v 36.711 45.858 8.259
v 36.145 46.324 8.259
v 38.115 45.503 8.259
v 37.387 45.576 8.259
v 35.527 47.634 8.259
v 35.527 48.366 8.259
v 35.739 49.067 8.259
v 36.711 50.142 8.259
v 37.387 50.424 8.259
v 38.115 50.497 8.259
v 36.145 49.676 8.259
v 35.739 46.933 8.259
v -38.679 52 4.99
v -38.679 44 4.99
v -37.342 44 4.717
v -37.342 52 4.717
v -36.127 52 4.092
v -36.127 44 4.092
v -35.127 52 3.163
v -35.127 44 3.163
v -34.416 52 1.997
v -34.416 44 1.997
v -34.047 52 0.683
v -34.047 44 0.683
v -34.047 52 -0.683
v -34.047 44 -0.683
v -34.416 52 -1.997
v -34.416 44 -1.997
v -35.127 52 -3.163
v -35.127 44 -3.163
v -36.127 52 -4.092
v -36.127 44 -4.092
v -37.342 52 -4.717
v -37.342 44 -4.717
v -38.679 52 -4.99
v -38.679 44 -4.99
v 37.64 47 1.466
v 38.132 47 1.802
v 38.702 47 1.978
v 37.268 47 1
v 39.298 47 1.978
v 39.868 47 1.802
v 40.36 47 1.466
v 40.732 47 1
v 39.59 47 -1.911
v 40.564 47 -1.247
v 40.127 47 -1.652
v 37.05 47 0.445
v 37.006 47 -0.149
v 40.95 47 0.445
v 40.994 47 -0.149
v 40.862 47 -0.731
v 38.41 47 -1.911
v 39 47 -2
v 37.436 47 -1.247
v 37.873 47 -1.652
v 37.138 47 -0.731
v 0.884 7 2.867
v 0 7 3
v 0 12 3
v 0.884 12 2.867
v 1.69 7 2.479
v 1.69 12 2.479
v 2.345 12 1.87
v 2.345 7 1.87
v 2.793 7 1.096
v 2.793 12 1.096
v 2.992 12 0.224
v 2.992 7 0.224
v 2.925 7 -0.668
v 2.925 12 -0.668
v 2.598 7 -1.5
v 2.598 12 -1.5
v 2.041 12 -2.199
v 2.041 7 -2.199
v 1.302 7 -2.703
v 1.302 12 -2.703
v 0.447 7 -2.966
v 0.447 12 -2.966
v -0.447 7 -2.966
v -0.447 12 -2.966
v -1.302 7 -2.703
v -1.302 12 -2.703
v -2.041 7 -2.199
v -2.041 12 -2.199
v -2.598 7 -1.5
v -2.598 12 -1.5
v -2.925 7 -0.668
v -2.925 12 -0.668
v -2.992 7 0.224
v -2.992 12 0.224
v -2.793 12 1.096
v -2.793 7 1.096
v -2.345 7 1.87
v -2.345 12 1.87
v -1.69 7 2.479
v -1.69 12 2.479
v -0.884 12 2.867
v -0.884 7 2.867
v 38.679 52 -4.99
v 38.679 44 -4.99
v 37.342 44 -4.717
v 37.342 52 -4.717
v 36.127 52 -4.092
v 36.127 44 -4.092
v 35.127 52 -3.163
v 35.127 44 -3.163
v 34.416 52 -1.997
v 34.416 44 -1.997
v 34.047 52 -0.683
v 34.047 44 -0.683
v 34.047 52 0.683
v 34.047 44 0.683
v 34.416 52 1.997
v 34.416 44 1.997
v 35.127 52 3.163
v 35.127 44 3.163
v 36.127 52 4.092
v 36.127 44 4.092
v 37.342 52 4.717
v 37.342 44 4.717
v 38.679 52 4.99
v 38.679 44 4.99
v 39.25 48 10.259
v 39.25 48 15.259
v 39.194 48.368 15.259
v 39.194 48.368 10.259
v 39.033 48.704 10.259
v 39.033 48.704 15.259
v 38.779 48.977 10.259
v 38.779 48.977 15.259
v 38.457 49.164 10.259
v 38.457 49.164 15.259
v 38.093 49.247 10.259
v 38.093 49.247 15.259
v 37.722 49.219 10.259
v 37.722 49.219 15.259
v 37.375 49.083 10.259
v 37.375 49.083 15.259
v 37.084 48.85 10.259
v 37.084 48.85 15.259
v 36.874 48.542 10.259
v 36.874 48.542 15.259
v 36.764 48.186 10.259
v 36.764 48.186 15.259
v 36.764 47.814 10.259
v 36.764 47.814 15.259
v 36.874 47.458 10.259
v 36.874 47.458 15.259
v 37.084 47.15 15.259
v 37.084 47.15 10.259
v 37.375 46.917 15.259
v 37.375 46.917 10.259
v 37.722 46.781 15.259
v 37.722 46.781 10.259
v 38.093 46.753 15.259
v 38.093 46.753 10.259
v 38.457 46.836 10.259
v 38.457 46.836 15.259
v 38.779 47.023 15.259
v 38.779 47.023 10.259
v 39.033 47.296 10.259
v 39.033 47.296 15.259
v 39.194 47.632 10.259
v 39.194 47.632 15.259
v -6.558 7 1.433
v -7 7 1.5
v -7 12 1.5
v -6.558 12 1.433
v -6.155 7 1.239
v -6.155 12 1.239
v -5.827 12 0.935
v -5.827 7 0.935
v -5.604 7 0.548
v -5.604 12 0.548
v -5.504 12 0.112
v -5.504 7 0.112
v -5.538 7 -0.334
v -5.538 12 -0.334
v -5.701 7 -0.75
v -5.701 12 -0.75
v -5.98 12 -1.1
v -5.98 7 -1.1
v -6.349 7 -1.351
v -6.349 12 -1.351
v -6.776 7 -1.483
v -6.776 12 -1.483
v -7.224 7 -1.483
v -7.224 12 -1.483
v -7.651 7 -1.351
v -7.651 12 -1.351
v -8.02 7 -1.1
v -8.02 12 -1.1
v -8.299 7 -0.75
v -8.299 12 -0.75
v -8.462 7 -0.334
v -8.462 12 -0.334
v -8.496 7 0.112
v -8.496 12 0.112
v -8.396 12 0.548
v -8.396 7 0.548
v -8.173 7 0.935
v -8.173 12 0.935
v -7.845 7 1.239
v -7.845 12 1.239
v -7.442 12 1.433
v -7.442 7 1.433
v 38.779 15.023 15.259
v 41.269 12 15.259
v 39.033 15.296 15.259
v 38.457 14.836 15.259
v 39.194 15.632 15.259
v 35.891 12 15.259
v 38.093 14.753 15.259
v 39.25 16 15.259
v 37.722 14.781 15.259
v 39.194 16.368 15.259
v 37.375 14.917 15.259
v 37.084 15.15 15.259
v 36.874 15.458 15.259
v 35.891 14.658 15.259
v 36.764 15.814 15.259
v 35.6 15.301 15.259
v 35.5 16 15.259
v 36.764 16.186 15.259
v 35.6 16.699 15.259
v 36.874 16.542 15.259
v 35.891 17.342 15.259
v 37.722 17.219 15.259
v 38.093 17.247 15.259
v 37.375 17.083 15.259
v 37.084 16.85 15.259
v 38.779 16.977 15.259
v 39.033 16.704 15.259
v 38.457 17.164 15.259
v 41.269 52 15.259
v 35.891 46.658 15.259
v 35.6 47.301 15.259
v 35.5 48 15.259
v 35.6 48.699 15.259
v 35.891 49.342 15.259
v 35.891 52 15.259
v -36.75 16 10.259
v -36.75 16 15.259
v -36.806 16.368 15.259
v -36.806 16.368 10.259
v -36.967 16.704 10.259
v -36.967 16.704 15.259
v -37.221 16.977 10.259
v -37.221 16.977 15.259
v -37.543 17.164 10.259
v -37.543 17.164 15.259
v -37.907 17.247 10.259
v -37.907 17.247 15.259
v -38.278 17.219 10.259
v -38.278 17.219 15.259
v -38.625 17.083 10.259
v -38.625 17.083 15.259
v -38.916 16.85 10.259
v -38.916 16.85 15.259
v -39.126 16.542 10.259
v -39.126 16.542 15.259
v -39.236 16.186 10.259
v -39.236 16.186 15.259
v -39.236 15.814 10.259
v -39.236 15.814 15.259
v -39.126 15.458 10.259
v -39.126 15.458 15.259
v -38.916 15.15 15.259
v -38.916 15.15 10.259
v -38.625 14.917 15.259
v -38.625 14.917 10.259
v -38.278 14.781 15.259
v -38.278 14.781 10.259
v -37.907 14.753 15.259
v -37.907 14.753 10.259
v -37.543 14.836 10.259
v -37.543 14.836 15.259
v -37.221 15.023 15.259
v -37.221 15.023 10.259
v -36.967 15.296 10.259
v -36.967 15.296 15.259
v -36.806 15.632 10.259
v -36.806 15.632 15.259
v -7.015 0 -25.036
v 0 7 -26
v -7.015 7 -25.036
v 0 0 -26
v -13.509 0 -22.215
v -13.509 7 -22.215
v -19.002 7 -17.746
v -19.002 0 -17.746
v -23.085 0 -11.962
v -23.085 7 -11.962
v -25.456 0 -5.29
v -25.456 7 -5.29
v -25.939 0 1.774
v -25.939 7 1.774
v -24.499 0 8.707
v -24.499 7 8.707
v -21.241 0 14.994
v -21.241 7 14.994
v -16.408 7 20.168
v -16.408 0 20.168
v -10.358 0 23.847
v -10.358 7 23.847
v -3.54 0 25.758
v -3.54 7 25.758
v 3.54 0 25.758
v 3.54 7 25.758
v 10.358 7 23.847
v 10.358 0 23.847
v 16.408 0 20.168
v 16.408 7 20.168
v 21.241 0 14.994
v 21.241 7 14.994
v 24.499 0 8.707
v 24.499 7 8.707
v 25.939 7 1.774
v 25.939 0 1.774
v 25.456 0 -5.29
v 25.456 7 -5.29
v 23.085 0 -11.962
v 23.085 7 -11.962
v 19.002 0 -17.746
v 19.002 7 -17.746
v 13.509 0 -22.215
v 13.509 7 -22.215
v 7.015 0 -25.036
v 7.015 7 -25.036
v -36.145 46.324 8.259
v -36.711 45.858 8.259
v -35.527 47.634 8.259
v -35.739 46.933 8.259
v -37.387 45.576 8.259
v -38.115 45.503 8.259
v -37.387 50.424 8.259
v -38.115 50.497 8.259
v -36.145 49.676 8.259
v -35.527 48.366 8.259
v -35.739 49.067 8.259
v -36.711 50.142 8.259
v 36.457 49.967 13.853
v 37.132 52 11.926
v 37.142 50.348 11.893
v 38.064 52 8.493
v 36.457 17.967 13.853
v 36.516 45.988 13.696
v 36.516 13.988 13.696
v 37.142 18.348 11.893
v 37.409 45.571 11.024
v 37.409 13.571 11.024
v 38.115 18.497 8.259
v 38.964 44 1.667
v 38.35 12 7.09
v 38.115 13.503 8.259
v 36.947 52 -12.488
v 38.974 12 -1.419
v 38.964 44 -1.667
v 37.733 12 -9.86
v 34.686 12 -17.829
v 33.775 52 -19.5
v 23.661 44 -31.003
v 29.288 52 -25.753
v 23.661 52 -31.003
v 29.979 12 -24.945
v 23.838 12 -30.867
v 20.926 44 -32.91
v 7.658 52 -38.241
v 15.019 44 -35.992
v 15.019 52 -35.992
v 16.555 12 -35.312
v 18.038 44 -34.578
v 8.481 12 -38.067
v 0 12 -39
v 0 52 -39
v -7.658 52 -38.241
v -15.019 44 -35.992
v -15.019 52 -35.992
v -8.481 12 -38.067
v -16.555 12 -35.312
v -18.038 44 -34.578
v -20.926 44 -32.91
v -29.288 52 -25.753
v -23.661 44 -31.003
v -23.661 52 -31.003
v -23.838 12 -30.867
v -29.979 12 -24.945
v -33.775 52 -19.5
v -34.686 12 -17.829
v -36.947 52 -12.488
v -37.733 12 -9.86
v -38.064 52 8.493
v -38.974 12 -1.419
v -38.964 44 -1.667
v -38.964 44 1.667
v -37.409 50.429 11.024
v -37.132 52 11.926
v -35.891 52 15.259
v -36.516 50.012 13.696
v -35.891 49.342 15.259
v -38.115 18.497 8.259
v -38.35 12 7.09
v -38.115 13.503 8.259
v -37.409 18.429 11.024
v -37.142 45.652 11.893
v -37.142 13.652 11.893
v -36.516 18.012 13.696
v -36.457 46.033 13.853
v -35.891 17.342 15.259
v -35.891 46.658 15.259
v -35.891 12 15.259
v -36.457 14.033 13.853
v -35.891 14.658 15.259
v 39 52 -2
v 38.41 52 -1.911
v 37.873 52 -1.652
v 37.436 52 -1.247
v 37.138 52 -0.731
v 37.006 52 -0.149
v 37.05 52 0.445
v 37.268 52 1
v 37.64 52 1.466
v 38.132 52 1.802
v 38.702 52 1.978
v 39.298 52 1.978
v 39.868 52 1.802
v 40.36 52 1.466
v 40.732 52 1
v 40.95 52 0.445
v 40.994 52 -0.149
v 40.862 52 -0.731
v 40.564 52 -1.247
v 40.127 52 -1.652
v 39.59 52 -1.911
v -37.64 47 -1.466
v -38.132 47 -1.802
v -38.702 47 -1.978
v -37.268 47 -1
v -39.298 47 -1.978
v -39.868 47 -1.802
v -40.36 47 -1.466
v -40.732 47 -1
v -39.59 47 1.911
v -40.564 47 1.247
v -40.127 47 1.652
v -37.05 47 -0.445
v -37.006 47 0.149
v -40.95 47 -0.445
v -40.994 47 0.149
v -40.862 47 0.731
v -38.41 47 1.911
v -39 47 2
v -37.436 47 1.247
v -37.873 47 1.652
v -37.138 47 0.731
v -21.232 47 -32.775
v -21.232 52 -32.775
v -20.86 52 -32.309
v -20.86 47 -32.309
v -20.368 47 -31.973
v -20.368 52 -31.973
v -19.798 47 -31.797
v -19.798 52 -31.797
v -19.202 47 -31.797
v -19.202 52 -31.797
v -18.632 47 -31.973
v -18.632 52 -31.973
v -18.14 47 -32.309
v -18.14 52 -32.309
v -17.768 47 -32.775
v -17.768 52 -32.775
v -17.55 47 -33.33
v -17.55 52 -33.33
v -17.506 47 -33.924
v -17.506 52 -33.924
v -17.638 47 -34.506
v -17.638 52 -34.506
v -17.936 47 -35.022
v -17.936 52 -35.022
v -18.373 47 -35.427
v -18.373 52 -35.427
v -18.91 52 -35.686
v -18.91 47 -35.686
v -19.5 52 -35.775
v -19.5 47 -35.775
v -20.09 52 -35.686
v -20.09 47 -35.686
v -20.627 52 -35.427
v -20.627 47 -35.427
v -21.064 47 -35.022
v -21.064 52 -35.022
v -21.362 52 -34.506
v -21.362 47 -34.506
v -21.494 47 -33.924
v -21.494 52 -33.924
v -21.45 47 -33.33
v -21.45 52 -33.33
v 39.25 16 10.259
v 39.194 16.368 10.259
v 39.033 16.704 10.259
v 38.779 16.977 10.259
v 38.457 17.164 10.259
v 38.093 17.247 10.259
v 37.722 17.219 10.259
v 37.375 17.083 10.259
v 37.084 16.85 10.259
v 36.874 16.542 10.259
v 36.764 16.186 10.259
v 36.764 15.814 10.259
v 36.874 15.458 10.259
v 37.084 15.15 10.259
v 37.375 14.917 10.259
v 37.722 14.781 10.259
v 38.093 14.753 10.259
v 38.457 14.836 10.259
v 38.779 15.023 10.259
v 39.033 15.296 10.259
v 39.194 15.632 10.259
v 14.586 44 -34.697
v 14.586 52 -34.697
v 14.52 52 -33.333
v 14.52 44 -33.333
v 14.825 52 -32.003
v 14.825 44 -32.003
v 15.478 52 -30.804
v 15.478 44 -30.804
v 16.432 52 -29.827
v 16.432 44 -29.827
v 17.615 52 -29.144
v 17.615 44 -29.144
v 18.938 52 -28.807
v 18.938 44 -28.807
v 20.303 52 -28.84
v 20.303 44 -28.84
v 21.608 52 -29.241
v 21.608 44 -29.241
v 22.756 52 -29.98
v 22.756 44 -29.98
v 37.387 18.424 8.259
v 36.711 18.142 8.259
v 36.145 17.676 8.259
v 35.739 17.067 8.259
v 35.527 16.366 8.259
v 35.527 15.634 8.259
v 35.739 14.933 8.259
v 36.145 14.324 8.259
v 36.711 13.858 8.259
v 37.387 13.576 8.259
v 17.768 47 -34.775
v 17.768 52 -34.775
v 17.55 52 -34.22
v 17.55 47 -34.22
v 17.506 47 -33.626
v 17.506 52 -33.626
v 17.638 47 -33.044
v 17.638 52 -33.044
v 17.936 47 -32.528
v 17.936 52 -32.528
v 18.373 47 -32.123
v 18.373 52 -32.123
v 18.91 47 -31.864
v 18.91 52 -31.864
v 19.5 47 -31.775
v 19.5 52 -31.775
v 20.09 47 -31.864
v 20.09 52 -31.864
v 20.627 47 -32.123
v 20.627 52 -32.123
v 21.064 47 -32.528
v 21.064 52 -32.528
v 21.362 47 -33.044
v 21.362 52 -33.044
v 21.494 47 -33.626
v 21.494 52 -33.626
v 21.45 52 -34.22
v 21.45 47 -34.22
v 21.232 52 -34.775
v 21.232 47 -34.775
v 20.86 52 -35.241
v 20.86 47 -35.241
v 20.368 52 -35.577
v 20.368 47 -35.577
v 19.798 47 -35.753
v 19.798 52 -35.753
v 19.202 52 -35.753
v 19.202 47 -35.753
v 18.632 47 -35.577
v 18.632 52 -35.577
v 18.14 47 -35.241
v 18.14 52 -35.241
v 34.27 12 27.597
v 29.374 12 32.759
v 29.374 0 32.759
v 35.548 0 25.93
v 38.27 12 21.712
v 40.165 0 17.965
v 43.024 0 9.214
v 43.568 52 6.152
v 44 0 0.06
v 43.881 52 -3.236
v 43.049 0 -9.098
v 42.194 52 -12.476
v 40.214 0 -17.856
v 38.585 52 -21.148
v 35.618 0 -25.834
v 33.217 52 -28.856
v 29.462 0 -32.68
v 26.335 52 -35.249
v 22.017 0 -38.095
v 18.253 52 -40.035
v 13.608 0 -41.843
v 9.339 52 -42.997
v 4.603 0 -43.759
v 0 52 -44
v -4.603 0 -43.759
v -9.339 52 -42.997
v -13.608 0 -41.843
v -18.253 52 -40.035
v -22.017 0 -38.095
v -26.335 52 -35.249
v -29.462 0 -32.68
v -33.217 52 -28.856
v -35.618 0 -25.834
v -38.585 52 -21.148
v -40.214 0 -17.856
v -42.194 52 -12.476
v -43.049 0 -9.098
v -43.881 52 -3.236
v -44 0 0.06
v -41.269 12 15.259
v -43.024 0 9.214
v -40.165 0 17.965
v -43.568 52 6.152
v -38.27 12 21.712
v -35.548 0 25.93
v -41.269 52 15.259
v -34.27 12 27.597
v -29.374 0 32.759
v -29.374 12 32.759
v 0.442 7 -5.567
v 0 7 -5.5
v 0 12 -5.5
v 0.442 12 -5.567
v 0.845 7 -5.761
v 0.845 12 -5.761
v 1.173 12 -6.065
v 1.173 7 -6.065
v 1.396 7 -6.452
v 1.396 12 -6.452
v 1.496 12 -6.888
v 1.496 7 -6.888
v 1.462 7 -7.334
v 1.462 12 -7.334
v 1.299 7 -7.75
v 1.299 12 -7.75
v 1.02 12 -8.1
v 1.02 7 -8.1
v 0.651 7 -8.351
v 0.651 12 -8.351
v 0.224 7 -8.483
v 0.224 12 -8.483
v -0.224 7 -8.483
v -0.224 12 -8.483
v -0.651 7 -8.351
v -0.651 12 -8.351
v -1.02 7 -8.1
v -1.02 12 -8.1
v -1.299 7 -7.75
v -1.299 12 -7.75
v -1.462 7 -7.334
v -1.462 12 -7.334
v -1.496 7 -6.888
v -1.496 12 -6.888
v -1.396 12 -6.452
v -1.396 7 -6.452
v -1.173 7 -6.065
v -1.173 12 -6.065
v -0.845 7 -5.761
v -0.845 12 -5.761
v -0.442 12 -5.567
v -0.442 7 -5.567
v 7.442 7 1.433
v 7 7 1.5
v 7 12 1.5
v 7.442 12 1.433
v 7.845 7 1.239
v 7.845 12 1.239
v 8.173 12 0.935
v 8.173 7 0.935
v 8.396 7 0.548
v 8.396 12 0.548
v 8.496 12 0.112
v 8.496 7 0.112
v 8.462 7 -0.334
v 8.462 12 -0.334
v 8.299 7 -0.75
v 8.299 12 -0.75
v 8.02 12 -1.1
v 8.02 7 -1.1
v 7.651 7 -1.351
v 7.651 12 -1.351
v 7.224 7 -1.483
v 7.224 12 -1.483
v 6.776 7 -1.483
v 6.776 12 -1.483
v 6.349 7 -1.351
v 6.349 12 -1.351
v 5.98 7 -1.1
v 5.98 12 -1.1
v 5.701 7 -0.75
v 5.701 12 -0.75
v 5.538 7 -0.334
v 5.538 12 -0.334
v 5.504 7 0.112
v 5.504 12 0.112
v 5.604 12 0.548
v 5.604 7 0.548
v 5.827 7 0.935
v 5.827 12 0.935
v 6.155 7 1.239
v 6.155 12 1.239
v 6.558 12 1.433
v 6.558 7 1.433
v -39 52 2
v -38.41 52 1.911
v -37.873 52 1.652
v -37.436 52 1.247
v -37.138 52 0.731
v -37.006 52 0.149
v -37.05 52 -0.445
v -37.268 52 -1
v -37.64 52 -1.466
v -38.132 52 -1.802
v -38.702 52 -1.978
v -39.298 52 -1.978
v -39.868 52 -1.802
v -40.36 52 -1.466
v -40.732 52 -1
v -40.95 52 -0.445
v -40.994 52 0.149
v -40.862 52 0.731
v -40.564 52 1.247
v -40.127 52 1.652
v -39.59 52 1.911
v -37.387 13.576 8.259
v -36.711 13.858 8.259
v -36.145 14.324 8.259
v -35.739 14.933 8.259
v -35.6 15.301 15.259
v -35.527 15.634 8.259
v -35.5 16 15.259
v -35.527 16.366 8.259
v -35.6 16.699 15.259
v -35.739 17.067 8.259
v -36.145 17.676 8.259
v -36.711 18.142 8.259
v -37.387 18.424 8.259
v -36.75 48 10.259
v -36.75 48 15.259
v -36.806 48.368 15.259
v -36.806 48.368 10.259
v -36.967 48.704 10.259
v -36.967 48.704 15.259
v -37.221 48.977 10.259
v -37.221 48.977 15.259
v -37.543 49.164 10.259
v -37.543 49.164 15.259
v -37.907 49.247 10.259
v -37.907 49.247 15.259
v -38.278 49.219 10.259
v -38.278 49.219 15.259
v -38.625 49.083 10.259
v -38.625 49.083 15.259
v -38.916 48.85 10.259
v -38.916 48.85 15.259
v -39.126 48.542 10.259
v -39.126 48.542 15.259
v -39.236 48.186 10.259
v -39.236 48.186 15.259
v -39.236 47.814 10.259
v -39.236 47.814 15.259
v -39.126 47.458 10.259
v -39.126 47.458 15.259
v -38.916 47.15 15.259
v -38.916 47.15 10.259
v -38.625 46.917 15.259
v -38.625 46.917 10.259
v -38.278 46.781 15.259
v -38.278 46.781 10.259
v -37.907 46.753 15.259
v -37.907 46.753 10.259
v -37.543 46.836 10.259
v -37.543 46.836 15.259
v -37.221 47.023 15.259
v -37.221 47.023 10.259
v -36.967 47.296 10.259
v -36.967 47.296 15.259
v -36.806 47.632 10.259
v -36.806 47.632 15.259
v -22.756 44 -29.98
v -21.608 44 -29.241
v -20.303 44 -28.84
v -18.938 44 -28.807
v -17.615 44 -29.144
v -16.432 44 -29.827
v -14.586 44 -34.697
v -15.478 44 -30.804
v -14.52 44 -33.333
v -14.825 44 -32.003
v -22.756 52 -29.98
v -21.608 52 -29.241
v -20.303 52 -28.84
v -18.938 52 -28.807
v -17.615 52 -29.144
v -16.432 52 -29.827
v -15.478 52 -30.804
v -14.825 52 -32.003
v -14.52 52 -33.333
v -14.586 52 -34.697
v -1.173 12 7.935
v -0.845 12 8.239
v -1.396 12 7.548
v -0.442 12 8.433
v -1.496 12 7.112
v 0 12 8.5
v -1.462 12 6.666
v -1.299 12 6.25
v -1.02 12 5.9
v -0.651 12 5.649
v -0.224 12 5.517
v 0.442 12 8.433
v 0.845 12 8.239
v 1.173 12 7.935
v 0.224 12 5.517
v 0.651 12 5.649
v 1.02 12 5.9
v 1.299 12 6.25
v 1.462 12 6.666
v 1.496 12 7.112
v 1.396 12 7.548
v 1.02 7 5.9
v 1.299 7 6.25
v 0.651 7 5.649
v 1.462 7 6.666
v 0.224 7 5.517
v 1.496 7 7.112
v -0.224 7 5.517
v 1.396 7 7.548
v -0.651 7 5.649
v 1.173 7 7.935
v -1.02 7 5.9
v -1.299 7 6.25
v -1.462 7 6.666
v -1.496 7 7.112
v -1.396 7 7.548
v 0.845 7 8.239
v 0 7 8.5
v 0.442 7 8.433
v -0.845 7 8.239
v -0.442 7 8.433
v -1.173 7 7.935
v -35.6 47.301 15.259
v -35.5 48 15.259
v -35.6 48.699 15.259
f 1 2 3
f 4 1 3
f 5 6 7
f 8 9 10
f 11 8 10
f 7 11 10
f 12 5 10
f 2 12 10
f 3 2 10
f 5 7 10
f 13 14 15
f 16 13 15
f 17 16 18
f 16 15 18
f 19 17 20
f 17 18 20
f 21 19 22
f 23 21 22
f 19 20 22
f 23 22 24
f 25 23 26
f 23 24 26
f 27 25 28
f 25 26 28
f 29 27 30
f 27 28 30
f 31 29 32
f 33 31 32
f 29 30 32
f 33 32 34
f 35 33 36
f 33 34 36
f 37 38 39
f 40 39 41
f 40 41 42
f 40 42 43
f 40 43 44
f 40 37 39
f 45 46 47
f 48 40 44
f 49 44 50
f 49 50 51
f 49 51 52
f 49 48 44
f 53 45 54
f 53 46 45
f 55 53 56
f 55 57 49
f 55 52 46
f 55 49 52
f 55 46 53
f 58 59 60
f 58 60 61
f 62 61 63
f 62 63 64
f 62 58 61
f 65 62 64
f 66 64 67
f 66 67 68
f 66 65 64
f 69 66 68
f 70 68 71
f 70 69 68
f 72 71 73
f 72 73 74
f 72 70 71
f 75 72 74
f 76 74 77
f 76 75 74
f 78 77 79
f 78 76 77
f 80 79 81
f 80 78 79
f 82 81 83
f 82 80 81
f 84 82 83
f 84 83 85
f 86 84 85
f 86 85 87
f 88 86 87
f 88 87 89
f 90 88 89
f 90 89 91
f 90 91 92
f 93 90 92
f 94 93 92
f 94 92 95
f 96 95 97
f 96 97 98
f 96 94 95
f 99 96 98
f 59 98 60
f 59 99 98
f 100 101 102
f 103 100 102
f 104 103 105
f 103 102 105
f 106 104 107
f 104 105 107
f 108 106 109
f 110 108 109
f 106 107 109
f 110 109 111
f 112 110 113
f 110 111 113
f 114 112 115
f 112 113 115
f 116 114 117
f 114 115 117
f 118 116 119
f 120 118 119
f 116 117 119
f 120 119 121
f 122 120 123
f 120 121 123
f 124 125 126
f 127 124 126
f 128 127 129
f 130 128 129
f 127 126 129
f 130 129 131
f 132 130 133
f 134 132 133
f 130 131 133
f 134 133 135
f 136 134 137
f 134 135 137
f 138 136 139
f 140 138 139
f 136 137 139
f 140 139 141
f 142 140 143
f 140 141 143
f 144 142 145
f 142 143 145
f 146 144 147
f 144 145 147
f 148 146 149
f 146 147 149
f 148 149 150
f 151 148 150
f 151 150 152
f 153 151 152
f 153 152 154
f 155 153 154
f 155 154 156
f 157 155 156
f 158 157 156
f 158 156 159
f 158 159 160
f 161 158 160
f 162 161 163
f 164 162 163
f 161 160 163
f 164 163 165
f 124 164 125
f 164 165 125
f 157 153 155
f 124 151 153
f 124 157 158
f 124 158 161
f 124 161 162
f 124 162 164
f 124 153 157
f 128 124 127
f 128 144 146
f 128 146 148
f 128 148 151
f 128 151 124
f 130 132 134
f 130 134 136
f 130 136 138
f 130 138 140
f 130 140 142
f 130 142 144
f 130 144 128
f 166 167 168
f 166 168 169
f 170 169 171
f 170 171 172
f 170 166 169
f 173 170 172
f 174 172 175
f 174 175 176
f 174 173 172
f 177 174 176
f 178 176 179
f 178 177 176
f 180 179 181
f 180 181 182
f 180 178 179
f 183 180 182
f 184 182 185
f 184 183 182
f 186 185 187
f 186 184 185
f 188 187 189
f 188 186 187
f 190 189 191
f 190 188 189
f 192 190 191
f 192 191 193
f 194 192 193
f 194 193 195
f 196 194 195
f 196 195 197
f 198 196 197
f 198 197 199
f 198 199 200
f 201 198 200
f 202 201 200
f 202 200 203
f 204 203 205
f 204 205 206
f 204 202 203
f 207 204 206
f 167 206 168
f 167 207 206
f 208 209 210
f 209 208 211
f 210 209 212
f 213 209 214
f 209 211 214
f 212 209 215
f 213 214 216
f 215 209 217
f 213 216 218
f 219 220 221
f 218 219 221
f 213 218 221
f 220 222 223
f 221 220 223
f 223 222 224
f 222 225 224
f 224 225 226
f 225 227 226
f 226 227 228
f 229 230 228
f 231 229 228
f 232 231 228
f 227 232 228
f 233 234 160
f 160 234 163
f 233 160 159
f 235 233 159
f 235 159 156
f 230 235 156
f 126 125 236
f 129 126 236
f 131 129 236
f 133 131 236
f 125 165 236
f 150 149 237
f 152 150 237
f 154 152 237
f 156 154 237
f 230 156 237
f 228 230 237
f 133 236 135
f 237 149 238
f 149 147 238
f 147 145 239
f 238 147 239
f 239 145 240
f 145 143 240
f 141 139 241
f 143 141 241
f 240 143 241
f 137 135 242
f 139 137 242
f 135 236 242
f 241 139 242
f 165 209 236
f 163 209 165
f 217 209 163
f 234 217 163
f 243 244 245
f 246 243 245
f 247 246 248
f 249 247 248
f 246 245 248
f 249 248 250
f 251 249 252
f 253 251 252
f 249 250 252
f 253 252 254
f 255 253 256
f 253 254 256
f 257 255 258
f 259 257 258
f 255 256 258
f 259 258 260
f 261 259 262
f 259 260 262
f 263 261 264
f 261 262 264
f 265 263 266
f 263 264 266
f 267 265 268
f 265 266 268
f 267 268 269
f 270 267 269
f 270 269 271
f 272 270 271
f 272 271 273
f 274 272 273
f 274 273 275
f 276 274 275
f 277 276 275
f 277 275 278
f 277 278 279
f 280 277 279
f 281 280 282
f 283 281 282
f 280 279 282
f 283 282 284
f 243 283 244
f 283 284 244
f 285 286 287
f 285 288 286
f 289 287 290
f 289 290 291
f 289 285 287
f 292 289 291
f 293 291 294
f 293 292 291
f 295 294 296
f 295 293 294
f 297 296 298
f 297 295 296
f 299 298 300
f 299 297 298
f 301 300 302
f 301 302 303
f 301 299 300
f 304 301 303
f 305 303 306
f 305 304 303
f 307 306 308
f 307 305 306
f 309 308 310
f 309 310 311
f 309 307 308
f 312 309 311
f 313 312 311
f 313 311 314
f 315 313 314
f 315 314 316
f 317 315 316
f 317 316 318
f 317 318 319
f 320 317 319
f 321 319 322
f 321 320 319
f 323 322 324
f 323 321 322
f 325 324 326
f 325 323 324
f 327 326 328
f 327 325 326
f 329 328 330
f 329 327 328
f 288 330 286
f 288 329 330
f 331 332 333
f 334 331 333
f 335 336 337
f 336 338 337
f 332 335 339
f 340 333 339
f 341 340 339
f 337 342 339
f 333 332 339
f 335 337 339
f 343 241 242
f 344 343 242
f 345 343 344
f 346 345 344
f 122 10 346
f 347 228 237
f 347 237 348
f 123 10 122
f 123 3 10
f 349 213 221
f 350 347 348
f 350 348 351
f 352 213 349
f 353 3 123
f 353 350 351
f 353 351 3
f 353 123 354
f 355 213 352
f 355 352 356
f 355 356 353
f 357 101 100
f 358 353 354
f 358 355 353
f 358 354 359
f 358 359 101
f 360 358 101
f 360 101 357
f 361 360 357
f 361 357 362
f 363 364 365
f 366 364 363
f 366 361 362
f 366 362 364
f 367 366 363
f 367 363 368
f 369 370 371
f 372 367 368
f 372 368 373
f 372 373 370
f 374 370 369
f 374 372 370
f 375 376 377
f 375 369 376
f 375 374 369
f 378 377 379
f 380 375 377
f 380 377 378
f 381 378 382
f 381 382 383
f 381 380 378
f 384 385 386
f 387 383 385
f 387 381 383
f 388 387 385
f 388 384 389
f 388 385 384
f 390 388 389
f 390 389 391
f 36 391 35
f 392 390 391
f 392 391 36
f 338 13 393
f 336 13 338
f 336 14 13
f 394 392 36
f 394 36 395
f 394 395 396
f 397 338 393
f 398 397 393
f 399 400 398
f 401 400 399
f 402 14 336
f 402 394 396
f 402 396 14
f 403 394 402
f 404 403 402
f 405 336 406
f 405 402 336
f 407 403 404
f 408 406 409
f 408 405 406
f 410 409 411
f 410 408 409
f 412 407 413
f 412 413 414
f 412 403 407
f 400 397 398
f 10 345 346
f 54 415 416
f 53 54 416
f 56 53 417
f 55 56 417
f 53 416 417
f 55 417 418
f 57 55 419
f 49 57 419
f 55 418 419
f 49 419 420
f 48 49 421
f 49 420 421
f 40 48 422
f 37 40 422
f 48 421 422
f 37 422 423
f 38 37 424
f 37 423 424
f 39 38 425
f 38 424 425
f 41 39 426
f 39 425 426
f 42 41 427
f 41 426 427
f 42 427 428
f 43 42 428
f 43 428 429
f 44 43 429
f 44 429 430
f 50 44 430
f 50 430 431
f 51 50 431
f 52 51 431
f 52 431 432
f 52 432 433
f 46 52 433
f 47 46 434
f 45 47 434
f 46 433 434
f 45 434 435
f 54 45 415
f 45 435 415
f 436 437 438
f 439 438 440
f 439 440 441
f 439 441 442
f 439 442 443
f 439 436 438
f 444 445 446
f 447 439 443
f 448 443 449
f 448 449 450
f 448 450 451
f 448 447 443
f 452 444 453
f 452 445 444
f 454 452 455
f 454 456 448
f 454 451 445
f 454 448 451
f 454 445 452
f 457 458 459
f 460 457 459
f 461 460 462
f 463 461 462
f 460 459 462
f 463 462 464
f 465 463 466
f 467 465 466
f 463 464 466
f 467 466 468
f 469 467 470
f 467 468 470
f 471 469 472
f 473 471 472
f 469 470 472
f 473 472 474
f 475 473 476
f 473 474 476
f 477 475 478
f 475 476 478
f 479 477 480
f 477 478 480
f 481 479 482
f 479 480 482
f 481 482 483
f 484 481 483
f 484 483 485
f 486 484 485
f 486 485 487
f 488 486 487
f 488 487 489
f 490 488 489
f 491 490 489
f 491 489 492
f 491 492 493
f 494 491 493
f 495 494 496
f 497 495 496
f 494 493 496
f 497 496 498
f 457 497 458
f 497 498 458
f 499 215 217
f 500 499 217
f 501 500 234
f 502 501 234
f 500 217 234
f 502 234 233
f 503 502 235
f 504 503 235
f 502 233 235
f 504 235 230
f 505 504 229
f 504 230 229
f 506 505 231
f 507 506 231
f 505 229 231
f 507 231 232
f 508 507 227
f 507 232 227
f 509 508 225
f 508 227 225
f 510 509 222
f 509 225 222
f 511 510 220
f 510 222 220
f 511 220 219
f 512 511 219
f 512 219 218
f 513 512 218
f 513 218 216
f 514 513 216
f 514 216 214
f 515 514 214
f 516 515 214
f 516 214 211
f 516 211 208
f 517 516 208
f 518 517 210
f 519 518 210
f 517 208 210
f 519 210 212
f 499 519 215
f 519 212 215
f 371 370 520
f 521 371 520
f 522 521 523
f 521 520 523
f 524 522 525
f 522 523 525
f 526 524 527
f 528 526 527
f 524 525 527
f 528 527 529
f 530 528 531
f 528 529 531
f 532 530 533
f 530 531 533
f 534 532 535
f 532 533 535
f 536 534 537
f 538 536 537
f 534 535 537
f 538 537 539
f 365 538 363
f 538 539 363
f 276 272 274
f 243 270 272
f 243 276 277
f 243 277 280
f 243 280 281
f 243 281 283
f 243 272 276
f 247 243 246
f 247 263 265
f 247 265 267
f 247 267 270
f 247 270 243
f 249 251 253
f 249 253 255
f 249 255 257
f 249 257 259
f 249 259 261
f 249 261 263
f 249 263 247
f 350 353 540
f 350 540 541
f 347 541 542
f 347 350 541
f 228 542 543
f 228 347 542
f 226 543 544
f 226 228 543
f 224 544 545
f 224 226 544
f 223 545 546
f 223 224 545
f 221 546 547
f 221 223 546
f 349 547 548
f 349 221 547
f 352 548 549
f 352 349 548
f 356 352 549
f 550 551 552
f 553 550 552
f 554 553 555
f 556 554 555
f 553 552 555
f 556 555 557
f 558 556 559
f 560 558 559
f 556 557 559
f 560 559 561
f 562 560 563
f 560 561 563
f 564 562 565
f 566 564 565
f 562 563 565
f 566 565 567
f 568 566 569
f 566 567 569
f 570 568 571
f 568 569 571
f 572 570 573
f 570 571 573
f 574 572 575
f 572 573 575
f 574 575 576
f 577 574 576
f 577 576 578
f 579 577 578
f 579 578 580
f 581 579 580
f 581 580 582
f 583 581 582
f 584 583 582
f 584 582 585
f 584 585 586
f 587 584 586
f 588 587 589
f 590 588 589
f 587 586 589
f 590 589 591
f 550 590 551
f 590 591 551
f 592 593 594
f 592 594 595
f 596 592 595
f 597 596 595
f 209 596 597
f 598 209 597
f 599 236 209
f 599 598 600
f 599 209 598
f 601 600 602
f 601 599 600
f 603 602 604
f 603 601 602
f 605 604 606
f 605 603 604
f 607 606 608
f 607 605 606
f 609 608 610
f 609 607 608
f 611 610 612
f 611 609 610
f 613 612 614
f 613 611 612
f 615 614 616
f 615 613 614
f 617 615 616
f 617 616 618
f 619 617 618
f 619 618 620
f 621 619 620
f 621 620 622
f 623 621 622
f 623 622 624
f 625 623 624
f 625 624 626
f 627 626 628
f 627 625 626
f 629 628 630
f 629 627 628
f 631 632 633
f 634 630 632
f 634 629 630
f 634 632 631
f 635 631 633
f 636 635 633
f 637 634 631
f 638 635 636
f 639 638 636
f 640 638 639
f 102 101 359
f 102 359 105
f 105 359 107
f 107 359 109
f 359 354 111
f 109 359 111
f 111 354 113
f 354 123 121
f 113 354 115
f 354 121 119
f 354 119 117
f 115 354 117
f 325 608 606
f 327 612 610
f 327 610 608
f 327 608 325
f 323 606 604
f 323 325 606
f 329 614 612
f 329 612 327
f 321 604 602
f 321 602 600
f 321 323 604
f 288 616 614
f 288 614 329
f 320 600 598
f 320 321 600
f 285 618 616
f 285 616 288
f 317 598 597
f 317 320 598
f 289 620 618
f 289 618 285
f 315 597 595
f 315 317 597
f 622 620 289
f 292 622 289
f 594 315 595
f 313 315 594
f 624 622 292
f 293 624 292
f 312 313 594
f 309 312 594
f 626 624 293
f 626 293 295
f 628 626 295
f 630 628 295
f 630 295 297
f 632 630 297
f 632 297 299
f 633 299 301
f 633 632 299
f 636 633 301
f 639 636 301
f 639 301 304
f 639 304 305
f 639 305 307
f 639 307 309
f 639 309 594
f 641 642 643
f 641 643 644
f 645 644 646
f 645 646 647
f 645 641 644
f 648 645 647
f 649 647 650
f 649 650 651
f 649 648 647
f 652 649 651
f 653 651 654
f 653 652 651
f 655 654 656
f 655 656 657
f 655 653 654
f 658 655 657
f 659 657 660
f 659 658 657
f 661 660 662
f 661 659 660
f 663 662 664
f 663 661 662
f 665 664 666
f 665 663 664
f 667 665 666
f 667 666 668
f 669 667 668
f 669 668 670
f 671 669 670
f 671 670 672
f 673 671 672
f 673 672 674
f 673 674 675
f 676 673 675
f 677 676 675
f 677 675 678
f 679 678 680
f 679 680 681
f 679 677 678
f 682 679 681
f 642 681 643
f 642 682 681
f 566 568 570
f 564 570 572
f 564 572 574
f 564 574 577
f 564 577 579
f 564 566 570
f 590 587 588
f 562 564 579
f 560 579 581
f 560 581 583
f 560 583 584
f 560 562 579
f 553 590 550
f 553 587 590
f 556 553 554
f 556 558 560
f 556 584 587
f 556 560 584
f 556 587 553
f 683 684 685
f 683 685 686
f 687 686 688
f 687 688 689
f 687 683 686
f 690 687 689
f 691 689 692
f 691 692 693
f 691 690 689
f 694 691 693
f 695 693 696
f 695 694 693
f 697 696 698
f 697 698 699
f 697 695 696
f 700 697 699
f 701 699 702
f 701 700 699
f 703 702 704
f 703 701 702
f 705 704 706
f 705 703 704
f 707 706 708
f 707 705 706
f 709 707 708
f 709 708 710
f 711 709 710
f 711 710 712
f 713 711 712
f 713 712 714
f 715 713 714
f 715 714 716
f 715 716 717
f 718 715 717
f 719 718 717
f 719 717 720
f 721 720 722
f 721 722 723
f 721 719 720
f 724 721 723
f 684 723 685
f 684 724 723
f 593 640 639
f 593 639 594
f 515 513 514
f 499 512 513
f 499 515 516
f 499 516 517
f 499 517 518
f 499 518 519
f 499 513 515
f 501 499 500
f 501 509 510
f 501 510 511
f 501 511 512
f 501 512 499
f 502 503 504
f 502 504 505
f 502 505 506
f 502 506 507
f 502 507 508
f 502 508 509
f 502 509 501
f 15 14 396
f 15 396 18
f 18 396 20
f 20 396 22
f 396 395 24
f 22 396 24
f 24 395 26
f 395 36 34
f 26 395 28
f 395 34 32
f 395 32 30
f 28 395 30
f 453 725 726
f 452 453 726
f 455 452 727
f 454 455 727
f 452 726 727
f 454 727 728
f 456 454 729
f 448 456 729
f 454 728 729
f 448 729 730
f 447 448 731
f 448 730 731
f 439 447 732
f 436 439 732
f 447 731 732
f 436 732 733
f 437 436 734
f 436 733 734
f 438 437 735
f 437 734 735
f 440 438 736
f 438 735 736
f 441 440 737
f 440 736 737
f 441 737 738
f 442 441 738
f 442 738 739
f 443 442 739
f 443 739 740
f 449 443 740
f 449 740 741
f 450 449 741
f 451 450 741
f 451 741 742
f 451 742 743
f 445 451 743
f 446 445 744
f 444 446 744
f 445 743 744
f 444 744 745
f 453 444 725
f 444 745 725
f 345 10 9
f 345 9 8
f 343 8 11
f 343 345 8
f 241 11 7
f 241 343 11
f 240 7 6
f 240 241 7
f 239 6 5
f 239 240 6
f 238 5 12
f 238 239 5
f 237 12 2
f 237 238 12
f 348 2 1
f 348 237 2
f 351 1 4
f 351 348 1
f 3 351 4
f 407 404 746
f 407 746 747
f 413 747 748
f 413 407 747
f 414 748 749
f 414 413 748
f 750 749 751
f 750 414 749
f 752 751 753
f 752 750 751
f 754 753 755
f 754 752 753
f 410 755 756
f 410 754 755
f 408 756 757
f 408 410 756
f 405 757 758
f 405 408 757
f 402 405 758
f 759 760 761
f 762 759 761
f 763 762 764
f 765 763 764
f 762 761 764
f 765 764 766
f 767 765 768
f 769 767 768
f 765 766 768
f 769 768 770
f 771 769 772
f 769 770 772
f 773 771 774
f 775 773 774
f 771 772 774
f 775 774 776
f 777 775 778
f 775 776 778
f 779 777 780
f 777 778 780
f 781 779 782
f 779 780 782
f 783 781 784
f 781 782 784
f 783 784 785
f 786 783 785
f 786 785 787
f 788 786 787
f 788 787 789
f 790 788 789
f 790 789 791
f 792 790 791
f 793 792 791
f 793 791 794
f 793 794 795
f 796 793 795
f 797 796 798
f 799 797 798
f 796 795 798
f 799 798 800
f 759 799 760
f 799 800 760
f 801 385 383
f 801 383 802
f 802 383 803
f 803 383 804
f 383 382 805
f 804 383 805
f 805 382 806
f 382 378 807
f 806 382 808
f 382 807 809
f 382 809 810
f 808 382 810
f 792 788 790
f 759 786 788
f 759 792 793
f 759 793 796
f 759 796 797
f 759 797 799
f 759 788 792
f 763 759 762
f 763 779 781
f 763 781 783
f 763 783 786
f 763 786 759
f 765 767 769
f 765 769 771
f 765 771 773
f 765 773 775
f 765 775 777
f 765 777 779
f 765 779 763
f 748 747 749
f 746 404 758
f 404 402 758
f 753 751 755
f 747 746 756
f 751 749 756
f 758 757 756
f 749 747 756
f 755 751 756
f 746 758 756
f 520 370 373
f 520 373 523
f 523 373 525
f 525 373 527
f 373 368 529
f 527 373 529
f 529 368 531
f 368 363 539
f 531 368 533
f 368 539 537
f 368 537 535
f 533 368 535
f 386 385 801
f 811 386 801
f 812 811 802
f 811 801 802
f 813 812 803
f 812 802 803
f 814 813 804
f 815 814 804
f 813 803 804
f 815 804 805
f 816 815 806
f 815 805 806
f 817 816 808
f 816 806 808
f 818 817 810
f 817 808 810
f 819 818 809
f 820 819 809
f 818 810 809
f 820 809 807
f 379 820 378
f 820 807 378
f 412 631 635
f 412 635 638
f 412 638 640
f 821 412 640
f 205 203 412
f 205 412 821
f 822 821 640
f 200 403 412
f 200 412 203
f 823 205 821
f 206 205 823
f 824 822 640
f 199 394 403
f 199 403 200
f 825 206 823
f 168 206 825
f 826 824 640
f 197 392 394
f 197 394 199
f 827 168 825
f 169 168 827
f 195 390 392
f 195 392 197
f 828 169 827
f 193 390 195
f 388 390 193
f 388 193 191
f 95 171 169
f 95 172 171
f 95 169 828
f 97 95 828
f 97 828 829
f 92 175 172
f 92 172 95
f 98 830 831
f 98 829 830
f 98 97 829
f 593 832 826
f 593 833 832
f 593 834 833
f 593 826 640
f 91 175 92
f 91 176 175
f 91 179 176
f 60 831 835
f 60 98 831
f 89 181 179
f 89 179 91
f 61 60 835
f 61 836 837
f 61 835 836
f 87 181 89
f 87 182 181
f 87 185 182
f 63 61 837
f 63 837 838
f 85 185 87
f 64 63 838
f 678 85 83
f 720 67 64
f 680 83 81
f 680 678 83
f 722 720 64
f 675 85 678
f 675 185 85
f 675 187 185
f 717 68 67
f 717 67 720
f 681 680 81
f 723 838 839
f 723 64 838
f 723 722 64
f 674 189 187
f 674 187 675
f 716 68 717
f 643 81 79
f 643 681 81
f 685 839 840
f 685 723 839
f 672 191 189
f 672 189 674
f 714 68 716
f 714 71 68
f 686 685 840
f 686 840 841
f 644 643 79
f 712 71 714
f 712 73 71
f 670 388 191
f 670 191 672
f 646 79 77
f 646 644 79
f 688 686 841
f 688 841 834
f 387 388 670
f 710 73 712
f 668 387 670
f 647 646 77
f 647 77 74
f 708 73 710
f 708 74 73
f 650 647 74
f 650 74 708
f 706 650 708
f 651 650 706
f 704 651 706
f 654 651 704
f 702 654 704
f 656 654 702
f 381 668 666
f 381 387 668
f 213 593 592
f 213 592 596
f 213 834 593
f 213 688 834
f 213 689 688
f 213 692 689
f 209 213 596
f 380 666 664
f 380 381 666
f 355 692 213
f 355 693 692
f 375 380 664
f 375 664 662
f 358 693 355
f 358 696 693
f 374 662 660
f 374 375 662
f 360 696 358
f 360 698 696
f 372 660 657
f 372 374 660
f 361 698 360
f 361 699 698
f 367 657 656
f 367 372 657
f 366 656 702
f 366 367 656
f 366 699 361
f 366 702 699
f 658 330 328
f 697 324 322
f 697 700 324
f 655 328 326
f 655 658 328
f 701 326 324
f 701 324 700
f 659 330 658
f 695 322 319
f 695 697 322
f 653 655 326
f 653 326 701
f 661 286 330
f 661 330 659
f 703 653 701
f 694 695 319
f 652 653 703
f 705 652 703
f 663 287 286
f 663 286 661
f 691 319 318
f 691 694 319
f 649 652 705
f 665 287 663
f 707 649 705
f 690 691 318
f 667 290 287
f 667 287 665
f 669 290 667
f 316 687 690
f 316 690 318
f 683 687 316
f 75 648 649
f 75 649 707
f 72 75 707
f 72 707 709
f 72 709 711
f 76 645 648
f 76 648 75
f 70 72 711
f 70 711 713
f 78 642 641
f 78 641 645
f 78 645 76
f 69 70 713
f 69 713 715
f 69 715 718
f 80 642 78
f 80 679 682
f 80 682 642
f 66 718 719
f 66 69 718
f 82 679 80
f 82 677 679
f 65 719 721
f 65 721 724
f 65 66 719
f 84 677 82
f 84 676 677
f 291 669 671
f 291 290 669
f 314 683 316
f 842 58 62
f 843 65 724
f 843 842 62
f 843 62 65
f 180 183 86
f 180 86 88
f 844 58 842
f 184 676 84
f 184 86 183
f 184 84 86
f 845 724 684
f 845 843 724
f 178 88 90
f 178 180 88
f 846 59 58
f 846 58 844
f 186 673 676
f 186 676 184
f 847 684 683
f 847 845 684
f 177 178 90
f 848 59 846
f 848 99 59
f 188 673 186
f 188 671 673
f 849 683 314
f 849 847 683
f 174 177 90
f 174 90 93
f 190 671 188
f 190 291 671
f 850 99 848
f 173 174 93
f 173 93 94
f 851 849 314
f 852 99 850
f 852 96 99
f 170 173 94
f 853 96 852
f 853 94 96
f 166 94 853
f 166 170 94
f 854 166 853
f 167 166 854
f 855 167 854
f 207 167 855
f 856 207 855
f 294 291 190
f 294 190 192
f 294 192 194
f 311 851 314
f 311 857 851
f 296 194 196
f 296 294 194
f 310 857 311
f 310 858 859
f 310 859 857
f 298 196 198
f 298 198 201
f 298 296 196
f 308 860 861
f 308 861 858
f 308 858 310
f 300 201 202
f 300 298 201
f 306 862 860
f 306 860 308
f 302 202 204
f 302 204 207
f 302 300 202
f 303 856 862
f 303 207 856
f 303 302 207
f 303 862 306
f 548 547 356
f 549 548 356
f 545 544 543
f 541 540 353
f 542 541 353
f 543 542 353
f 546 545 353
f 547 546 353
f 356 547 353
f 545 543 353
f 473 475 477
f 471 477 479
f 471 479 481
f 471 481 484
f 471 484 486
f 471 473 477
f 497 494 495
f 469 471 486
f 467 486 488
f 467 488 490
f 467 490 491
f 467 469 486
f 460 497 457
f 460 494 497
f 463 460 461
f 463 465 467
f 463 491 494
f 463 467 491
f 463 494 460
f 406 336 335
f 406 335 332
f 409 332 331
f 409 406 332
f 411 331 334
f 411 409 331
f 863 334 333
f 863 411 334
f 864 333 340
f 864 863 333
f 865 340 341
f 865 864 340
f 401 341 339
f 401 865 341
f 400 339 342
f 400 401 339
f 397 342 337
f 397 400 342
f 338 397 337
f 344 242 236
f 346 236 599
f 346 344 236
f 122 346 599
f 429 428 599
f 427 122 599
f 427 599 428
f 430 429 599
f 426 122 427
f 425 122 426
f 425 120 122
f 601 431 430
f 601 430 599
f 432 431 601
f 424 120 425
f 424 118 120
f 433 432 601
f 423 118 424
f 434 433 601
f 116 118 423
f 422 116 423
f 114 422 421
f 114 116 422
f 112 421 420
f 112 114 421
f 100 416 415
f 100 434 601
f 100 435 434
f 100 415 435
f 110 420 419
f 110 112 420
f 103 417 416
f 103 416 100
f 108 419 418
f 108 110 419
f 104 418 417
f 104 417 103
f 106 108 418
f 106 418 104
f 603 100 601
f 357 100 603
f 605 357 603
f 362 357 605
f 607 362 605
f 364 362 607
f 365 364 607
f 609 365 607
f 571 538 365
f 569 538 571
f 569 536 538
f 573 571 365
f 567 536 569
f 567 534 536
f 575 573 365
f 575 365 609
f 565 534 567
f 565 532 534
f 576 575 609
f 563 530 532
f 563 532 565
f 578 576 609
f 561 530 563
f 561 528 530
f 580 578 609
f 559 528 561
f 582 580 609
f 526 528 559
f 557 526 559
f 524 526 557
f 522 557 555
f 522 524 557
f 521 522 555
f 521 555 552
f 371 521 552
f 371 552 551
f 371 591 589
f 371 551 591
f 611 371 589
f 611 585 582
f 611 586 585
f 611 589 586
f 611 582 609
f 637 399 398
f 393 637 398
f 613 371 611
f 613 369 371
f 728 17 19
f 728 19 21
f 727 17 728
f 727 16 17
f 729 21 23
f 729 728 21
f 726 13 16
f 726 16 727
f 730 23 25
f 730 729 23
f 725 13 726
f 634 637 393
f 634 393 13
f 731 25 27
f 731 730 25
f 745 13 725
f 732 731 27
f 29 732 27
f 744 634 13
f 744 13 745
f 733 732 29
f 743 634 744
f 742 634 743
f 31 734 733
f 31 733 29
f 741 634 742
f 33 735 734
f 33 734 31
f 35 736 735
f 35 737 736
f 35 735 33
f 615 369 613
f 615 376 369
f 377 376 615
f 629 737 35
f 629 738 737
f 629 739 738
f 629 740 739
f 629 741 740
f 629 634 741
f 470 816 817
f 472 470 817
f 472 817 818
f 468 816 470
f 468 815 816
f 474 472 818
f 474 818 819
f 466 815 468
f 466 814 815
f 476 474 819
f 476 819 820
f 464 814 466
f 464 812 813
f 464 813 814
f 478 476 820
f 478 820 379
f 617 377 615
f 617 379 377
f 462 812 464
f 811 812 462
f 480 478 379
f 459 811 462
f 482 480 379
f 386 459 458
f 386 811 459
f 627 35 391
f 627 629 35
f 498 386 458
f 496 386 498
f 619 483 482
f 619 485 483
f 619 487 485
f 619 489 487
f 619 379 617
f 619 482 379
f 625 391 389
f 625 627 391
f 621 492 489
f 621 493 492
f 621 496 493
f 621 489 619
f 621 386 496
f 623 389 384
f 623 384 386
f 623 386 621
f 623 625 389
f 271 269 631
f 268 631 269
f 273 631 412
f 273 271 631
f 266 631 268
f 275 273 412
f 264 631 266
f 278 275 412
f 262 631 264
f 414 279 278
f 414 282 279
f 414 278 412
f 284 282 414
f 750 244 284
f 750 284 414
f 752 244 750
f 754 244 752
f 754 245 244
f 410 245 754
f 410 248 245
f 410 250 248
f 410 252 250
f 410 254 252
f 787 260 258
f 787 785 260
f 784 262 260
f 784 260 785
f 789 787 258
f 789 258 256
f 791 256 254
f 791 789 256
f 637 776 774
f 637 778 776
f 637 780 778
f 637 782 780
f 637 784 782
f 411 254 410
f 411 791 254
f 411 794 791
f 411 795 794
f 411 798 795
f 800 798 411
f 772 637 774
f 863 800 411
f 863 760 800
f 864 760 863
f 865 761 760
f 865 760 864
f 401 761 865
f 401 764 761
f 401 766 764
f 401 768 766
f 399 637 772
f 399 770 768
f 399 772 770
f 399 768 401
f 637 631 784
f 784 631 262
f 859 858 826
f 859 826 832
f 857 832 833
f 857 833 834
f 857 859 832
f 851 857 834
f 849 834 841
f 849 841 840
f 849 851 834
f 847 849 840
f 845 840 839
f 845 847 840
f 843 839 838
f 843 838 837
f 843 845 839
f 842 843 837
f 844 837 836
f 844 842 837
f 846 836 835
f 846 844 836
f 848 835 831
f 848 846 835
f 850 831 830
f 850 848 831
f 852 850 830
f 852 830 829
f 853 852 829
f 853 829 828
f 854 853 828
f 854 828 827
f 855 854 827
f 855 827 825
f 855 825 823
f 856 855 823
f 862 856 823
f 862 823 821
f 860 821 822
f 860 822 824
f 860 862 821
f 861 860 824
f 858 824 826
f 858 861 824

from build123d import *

# Parameters (mm, degrees)
CUT_EXTRUDE_START        = 7
SKETCH_9_R               = 3
SKETCH_9_R_2             = 1.5
CUT_EXTRUDE_1_DEPTH      = 5
CUT_EXTRUDE_START_2      = 55
CUT_EXTRUDE_9_DEPTH      = 43
CUT_EXTRUDE_11_DEPTH     = 74.972968036
EXTRUDE_START            = -8
EXTRUDE_17_DEPTH         = 8
SKETCH_26_R              = 2
CUT_EXTRUDE_12_DEPTH     = 5
PATTERN_CIRCULAR_3_COUNT = 4
PATTERN_CIRCULAR_3_ANGLE = 180
SKETCH_22_R              = 2.5
EXTRUDE_19_DEPTH         = 7
SKETCH_28_R              = 1.25
CUT_EXTRUDE_13_DEPTH     = 5


with BuildPart() as part:
    # Эскиз6 → Повернуть1 (revolve)
    with BuildSketch(Plane(origin=(0, 0, 0), x_dir=(0, 0, -1), z_dir=(1, 0, 0))):
        Polygon((26, 0), (44, 0), (44, 52), (39, 52), (39, 12), (0, 12), (0, 7), (26, 7), align=None)
    revolve(axis=Axis((0, 0, 0), (0, 1, 0)))

    # Эскиз9 → Вырез-Вытянуть1 (cut)
    with BuildSketch(Plane(origin=(0, 0, 0), x_dir=(1, 0, 0), z_dir=(0, 1, 0)).offset(CUT_EXTRUDE_START)):
        with Locations(Location((0, 0, 0), (0, 0, 270))):
            Circle(SKETCH_9_R)
        with Locations(Location((0, 7, 0), (0, 0, 270))):
            Circle(SKETCH_9_R_2)
        with Locations(Location((7, 0, 0), (0, 0, 270))):
            Circle(SKETCH_9_R_2)
        with Locations(Location((0, -7, 0), (0, 0, 270))):
            Circle(SKETCH_9_R_2)
        with Locations(Location((-7, 0, 0), (0, 0, 270))):
            Circle(SKETCH_9_R_2)
    extrude(amount=CUT_EXTRUDE_1_DEPTH, mode=Mode.SUBTRACT)

    # Эскиз21 → Вырез-Вытянуть9 (cut)
    with BuildSketch(Plane(origin=(0, 0, 0), x_dir=(1, 0, 0), z_dir=(0, 1, 0)).offset(CUT_EXTRUDE_START_2)):
        with BuildLine():
            Line((41.269210876, -15.259496508), (-41.269210876, -15.259496508))
            ThreePointArc((-41.269210876, -15.259496508), (0, -44), (41.269210876, -15.259496508))
        make_face()
    extrude(amount=-CUT_EXTRUDE_9_DEPTH, mode=Mode.SUBTRACT)

    # Эскиз23 → Вырез-Вытянуть11 (cut, through all)
    with BuildSketch(Plane(origin=(0, 12, 0), x_dir=(1, 0, 0), z_dir=(0, 1, 0))):
        with BuildLine():
            Line((-29.373719352, -32.759496508), (29.373719352, -32.759496508))
            ThreePointArc((29.373719352, -32.759496508), (0, -44), (-29.373719352, -32.759496508))
        make_face()
    extrude(amount=-CUT_EXTRUDE_11_DEPTH, mode=Mode.SUBTRACT)

    # Эскиз25 → Бобышка-Вытянуть17 (add)
    with BuildSketch(Plane(origin=(0, 52, 0), x_dir=(1, 0, 0), z_dir=(0, 1, 0)).offset(EXTRUDE_START)):
        with BuildLine():
            ThreePointArc((-38.679487179, -4.989716578), (-34, 0), (-38.679487179, 4.989716578))
            ThreePointArc((-38.679487179, 4.989716578), (-39, 0), (-38.679487179, -4.989716578))
        make_face()
    extrude_17 = extrude(amount=EXTRUDE_17_DEPTH)

    # Эскиз26 → Вырез-Вытянуть12 (cut)
    with BuildSketch(Plane(origin=(0, 52, 0), x_dir=(1, 0, 0), z_dir=(0, 1, 0))):
        with Locations(Location((-39, 0, 0), (0, 0, 270))):
            Circle(SKETCH_26_R)
    cut_extrude_12 = extrude(amount=-CUT_EXTRUDE_12_DEPTH, mode=Mode.SUBTRACT)

    # Круговой массив3: Бобышка-Вытянуть17, Вырез-Вытянуть12 ×4 about axis
    pattern_circular_3_axis = Axis((0, 0, 0), (0, -1, 0))
    add([extrude_17.rotate(pattern_circular_3_axis, i * PATTERN_CIRCULAR_3_ANGLE / (PATTERN_CIRCULAR_3_COUNT - 1)) for i in range(1, PATTERN_CIRCULAR_3_COUNT)])
    add([cut_extrude_12.rotate(pattern_circular_3_axis, i * PATTERN_CIRCULAR_3_ANGLE / (PATTERN_CIRCULAR_3_COUNT - 1)) for i in range(1, PATTERN_CIRCULAR_3_COUNT)], mode=Mode.SUBTRACT)

    # Эскиз22 → Бобышка-Вытянуть19 (add)
    with BuildSketch(Plane.XY.offset(15.259496508)):
        with Locations((-38, 16)):
            Circle(SKETCH_22_R)
        with Locations((-38, 48)):
            Circle(SKETCH_22_R)
        with Locations((38, 48)):
            Circle(SKETCH_22_R)
        with Locations((38, 16)):
            Circle(SKETCH_22_R)
    extrude(amount=-EXTRUDE_19_DEPTH)

    # Эскиз28 → Вырез-Вытянуть13 (cut)
    with BuildSketch(Plane.XY.offset(15.259496508)):
        with Locations((-38, 16)):
            Circle(SKETCH_28_R)
        with Locations((-38, 48)):
            Circle(SKETCH_28_R)
        with Locations((38, 48)):
            Circle(SKETCH_28_R)
        with Locations((38, 16)):
            Circle(SKETCH_28_R)
    extrude(amount=-CUT_EXTRUDE_13_DEPTH, mode=Mode.SUBTRACT)


solid = part.part
